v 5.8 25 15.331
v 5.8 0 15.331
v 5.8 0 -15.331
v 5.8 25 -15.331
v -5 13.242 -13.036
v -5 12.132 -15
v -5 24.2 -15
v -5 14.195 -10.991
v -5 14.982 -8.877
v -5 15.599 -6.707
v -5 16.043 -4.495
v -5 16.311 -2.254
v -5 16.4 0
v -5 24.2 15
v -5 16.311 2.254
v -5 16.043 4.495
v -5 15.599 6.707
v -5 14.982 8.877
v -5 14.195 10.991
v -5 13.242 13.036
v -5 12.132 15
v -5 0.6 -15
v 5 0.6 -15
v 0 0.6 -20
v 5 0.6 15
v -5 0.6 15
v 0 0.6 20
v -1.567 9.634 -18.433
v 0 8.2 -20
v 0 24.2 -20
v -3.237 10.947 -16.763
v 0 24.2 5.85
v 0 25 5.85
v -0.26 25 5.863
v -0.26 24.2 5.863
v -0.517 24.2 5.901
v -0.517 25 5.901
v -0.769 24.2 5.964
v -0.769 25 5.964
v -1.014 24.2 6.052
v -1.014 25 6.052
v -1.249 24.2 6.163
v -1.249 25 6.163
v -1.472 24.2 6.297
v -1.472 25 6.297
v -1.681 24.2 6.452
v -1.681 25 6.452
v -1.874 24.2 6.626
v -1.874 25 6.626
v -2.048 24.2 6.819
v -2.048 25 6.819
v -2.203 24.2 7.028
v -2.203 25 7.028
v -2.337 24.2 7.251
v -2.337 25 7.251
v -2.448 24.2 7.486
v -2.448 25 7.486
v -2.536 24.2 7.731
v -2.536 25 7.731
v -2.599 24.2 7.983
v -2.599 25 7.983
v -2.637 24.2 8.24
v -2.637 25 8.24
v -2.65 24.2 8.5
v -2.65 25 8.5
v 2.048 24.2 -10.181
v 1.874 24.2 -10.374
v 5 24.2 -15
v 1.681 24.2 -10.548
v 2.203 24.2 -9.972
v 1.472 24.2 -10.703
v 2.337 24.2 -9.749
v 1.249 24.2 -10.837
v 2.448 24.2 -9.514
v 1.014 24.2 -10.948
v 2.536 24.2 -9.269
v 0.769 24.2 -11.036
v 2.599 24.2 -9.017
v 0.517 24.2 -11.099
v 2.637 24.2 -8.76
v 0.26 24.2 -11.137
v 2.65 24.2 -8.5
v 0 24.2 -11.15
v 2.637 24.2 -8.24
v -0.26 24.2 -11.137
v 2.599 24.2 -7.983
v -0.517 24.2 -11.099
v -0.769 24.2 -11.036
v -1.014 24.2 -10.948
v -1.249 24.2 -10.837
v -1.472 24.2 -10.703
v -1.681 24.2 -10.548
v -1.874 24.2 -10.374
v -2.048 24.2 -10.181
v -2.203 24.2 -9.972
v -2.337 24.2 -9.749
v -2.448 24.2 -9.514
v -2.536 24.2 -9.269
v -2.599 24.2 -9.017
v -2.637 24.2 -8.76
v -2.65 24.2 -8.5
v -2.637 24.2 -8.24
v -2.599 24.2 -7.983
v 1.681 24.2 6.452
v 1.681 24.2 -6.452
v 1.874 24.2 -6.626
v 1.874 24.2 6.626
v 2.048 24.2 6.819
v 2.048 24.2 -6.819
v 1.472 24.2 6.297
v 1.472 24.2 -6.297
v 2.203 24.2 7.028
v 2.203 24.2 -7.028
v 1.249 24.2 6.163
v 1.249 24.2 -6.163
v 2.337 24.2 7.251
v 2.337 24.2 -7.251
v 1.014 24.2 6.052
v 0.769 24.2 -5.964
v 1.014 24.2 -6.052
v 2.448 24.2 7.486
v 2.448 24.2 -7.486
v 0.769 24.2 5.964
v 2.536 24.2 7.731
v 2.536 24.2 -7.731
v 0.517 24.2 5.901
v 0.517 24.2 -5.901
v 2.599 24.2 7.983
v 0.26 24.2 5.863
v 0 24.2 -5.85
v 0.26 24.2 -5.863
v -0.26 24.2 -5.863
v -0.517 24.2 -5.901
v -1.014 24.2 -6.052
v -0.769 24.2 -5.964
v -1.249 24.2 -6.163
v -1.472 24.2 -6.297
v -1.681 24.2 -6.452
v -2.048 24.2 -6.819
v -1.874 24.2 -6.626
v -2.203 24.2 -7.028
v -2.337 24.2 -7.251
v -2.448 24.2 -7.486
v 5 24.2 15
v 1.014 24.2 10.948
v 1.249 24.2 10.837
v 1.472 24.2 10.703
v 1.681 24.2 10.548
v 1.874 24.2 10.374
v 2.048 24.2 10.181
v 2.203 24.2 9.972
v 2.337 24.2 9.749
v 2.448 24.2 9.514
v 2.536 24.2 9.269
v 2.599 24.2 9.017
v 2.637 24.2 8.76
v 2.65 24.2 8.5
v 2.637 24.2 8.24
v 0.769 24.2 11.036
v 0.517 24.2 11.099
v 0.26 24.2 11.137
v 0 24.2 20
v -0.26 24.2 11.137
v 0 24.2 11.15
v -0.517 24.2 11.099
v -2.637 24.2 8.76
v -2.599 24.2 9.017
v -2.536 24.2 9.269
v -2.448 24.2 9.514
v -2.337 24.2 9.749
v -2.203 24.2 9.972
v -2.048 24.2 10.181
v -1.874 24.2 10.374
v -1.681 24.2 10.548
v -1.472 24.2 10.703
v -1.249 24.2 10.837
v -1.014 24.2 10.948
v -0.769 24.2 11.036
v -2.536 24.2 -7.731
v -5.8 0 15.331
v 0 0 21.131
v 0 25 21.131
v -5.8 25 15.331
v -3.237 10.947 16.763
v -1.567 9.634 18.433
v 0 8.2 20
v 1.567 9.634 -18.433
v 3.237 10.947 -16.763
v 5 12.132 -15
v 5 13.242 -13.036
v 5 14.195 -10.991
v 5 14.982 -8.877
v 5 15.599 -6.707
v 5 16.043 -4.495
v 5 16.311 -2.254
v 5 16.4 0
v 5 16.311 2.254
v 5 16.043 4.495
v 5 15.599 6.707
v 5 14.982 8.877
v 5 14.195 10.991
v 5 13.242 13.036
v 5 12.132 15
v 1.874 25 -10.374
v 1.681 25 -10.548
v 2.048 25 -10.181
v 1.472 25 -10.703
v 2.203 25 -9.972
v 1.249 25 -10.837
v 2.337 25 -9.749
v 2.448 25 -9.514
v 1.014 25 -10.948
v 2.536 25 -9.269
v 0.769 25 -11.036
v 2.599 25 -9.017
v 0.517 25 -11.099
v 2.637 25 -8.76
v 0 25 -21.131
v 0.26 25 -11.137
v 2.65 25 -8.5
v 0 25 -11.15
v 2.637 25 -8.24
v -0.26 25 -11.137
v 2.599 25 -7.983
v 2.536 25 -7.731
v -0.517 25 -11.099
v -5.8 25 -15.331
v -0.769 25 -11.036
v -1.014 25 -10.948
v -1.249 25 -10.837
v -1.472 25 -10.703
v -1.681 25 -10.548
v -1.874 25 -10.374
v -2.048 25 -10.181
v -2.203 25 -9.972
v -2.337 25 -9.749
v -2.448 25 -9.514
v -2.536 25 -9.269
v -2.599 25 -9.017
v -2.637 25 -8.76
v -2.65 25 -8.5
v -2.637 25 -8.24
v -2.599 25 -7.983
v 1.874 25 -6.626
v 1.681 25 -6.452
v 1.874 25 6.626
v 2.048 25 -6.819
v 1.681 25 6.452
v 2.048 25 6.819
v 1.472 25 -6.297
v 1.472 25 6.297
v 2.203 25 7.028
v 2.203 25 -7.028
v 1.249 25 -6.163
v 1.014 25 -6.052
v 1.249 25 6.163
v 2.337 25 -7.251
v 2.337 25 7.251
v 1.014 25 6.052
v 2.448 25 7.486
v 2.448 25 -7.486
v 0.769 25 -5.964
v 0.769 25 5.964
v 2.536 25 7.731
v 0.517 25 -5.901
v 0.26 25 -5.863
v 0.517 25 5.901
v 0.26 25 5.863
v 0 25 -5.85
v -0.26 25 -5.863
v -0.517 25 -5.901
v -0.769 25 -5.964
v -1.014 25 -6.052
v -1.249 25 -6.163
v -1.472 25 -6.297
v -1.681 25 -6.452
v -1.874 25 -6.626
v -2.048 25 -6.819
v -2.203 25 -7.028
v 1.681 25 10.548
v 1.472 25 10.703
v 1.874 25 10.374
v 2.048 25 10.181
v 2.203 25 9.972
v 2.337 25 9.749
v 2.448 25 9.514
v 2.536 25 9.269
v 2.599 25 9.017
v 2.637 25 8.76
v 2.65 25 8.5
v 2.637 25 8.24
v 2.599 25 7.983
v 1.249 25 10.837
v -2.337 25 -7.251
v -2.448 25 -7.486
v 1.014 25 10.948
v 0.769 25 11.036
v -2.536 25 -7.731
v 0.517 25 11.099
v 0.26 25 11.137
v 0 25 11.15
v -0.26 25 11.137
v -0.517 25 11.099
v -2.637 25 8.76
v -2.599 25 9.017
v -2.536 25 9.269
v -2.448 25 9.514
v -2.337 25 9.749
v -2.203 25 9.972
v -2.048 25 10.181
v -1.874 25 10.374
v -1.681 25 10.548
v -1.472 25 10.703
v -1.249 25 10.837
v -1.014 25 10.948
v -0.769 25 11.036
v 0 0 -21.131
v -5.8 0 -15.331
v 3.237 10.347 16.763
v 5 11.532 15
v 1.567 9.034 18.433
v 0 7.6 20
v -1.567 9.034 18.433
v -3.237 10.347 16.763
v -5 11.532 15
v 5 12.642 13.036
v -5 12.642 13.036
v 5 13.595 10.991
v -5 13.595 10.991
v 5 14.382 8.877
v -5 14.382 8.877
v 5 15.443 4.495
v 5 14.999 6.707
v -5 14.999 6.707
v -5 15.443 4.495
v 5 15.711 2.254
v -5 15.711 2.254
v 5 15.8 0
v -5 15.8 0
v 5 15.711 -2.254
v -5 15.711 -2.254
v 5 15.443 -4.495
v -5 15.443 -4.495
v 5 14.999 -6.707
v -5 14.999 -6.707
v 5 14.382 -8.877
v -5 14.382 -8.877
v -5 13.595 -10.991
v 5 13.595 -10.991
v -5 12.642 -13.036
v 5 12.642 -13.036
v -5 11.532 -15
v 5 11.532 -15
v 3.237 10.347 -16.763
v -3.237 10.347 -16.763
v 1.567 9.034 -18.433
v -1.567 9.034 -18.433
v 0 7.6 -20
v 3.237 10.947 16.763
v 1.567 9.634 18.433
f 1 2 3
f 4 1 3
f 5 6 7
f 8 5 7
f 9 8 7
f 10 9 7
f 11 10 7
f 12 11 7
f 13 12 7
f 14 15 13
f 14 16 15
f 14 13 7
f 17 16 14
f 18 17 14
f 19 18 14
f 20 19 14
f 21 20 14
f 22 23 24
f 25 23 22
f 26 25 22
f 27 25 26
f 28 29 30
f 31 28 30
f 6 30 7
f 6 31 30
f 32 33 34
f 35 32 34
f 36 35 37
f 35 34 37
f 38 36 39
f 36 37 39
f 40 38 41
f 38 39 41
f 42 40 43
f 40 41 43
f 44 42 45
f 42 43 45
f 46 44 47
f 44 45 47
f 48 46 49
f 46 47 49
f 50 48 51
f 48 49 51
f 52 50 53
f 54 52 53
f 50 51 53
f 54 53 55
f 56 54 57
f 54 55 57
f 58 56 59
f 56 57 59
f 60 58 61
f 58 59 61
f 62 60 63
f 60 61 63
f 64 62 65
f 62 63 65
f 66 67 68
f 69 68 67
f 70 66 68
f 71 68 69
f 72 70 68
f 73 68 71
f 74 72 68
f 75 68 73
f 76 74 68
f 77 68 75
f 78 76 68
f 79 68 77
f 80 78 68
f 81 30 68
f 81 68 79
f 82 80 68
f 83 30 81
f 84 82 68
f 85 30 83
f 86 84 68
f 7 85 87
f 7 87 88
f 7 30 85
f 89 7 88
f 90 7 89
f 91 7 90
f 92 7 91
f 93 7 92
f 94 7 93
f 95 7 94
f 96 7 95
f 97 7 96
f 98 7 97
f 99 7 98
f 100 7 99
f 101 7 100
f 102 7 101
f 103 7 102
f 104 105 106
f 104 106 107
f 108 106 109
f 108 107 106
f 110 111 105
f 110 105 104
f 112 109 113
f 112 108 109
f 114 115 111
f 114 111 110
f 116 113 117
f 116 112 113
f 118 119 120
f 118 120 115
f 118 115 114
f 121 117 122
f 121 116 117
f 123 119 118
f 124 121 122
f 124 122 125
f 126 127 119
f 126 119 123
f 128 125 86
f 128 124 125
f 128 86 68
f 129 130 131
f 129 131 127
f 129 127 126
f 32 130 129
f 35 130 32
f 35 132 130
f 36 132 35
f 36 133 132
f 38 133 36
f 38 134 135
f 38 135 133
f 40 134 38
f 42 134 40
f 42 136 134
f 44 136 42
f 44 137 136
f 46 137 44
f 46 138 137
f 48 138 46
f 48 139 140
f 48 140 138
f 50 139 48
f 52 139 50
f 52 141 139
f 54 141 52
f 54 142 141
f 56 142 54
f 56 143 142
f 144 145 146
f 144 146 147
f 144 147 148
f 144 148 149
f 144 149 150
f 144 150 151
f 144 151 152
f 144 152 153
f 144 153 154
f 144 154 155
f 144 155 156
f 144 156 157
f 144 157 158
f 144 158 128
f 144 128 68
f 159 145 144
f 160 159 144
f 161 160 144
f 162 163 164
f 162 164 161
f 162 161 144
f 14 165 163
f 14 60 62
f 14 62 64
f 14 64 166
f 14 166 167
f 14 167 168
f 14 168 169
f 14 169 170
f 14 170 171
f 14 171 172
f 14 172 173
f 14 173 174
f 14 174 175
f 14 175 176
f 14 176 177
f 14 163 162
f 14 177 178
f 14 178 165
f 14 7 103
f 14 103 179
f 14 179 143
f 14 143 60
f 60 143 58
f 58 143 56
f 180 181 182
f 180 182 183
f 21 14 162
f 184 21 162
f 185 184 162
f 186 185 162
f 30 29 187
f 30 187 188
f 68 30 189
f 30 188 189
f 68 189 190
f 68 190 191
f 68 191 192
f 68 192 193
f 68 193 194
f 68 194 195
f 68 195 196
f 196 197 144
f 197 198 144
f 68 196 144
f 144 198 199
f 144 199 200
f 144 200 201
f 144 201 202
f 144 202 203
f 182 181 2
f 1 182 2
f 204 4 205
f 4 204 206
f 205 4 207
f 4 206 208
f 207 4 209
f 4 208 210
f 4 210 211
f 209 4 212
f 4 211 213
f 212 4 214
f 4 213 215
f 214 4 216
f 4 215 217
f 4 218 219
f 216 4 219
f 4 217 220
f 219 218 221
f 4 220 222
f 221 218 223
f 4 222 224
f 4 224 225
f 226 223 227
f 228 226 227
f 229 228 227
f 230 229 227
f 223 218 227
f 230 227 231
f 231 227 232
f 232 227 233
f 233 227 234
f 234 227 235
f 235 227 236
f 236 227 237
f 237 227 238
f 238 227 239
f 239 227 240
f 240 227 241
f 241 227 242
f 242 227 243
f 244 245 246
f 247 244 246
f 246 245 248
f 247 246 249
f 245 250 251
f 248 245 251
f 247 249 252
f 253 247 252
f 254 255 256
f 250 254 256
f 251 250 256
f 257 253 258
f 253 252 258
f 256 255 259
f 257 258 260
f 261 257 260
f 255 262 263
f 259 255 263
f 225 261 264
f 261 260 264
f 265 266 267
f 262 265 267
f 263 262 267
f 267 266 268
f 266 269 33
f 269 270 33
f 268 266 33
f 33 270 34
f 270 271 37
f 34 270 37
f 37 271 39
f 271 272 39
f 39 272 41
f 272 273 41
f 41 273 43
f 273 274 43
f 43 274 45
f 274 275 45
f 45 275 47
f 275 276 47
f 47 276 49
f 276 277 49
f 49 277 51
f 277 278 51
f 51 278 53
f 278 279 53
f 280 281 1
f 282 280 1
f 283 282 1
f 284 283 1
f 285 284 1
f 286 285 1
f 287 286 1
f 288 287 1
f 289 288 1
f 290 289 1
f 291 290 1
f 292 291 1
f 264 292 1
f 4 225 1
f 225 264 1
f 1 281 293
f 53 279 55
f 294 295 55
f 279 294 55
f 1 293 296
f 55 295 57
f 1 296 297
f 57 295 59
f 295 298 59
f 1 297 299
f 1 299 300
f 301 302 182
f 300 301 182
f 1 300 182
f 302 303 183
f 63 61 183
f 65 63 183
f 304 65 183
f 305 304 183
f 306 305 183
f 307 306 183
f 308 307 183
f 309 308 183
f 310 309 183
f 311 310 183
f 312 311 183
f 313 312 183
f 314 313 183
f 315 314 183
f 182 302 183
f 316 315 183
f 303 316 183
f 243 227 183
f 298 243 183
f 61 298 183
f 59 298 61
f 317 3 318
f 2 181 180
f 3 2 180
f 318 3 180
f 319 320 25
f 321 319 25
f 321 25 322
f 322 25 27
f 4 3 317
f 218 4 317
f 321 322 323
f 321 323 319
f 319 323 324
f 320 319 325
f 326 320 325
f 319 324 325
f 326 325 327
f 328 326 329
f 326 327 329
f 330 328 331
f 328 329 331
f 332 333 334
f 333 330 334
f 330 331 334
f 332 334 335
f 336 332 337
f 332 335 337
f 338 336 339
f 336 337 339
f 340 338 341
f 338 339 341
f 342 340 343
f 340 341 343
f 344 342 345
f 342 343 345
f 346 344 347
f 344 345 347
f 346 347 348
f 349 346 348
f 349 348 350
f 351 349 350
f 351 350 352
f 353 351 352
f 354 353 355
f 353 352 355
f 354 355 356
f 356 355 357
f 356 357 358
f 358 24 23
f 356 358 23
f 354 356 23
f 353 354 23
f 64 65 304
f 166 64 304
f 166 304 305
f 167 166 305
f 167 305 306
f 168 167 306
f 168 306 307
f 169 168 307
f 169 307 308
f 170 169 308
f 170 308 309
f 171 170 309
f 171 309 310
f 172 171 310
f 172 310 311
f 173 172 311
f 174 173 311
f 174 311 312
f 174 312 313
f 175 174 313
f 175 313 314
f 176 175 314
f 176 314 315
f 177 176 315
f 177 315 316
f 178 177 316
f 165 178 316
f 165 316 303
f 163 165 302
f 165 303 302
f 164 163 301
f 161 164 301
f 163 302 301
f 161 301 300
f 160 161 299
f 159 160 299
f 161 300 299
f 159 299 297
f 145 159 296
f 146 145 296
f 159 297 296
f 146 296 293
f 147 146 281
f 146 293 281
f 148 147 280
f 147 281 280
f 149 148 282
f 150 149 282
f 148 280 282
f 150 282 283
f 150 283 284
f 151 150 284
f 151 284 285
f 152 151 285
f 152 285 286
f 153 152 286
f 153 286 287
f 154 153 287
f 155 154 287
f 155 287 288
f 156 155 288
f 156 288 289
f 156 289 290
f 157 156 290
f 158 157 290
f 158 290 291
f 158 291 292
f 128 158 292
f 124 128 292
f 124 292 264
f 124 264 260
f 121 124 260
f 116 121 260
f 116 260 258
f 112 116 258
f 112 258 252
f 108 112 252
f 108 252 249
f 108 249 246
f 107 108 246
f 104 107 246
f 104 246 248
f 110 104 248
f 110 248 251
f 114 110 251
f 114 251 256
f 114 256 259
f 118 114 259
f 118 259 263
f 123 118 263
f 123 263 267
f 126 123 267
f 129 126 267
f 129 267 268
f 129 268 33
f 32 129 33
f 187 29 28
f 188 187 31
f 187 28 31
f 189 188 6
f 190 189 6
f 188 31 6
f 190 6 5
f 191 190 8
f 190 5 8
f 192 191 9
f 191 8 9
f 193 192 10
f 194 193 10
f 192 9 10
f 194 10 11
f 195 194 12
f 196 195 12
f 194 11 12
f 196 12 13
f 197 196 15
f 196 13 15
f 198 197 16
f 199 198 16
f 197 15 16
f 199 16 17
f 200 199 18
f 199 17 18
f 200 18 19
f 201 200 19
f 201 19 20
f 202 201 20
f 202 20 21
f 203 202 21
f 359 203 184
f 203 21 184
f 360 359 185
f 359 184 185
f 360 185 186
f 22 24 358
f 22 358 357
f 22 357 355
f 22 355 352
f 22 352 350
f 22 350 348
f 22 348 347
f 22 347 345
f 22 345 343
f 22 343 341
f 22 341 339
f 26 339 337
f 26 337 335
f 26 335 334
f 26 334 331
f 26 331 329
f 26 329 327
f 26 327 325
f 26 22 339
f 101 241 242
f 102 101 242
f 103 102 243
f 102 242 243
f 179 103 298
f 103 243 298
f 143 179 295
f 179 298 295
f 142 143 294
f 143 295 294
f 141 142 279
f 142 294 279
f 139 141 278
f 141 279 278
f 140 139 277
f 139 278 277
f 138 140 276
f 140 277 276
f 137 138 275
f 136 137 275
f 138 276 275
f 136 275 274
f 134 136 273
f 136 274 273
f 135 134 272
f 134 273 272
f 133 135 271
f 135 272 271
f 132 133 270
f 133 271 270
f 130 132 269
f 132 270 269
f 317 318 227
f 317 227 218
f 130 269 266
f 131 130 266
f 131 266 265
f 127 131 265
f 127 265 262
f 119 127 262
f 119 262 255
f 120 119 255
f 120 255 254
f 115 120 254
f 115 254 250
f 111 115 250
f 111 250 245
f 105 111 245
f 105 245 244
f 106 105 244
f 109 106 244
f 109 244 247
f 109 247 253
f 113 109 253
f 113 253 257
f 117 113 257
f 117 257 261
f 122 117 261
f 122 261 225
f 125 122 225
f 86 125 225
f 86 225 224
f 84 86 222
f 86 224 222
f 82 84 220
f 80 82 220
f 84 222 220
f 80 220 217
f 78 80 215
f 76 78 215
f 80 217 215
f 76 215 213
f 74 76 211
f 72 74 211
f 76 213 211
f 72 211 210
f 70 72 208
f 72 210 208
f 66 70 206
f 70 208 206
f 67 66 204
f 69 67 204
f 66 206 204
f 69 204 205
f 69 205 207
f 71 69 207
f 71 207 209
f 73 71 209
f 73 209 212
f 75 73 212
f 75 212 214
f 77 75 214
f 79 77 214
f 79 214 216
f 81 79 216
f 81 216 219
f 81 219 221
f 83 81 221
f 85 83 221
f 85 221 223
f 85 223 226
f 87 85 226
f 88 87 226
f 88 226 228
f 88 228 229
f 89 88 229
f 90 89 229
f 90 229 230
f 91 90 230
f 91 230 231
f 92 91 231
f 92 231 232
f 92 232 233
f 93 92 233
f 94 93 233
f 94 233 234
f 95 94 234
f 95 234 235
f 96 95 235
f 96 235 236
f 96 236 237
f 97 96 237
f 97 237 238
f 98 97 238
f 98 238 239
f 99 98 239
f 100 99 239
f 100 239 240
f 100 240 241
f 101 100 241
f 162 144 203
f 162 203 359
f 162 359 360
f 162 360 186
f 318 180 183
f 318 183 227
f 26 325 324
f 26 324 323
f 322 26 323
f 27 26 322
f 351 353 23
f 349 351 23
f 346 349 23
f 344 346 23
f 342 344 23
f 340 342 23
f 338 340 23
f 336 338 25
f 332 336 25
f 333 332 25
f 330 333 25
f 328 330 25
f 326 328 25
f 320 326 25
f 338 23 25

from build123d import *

# Parameters (mm, degrees)
F1_DEPTH = 0.6
F2_DEPTH = 25
F3_W     = 0.8
F3_H     = 40
F7_DEPTH = 2


with BuildPart() as f1:
    # F0 (on Front) → F1 (new body)
    with BuildSketch(Plane.XZ):
        Polygon((0, -20), (0, 20), (-5, 15), (-5, -15), align=None)
        Polygon((-5, 15), (0, 20), (0, 21.1313708499), (-5.8, 15.3313708499), (-5.8, -15.3313708499), (0, -21.1313708499), (0, -20), (-5, -15), align=None)
    extrude(amount=-F1_DEPTH)

    # F0 (on Front) → F2 (join)
    with BuildSketch(Plane.XZ):
        Polygon((-5, 15), (0, 20), (0, 21.1313708499), (-5.8, 15.3313708499), (-5.8, -15.3313708499), (0, -21.1313708499), (0, -20), (-5, -15), align=None)
    extrude(amount=-F2_DEPTH)

    # F3 (on face) → F4 (join, up to the next surface of F1)
    with BuildSketch(Plane.YZ):
        with Locations((24.6, 0)):
            Rectangle(F3_W, F3_H)
        with BuildLine():
            ThreePointArc((8.2, -20), (16.4, 0), (8.2, 20))
            Line((8.2, 20), (7.6, 20))
            ThreePointArc((7.6, 20), (15.8, 0), (7.6, -20))
            Line((7.6, -20), (8.2, -20))
        make_face()
    extrude(until=Until.NEXT, dir=(-1, 0, 0))

    # F5: F1 across face


with BuildPart() as f1_1:
    add(f1.part)
    add(f1.part.mirror(Plane(origin=(0, 13.3750956502, 0), x_dir=(0, 1, 0), z_dir=(1, 0, 0))))

    # F6 (on face) → F7 (cut)
    with BuildSketch(Plane(origin=(0, 25, 0), x_dir=(-1, 0, 0), z_dir=(0, 1, 0))):
        with BuildLine():
            ThreePointArc((2.65, 8.5), (-1.8738329701, 10.3738329701), (0, 5.85))
            ThreePointArc((0, 5.85), (1.8738329701, 6.6261670299), (2.65, 8.5))
        make_face()
        with BuildLine():
            ThreePointArc((2.65, -8.5), (1.8738329701, -6.6261670299), (0, -5.85))
            ThreePointArc((0, -5.85), (-1.8738329701, -10.3738329701), (2.65, -8.5))
        make_face()
    extrude(amount=-F7_DEPTH, mode=Mode.SUBTRACT)


solid = f1_1.part
